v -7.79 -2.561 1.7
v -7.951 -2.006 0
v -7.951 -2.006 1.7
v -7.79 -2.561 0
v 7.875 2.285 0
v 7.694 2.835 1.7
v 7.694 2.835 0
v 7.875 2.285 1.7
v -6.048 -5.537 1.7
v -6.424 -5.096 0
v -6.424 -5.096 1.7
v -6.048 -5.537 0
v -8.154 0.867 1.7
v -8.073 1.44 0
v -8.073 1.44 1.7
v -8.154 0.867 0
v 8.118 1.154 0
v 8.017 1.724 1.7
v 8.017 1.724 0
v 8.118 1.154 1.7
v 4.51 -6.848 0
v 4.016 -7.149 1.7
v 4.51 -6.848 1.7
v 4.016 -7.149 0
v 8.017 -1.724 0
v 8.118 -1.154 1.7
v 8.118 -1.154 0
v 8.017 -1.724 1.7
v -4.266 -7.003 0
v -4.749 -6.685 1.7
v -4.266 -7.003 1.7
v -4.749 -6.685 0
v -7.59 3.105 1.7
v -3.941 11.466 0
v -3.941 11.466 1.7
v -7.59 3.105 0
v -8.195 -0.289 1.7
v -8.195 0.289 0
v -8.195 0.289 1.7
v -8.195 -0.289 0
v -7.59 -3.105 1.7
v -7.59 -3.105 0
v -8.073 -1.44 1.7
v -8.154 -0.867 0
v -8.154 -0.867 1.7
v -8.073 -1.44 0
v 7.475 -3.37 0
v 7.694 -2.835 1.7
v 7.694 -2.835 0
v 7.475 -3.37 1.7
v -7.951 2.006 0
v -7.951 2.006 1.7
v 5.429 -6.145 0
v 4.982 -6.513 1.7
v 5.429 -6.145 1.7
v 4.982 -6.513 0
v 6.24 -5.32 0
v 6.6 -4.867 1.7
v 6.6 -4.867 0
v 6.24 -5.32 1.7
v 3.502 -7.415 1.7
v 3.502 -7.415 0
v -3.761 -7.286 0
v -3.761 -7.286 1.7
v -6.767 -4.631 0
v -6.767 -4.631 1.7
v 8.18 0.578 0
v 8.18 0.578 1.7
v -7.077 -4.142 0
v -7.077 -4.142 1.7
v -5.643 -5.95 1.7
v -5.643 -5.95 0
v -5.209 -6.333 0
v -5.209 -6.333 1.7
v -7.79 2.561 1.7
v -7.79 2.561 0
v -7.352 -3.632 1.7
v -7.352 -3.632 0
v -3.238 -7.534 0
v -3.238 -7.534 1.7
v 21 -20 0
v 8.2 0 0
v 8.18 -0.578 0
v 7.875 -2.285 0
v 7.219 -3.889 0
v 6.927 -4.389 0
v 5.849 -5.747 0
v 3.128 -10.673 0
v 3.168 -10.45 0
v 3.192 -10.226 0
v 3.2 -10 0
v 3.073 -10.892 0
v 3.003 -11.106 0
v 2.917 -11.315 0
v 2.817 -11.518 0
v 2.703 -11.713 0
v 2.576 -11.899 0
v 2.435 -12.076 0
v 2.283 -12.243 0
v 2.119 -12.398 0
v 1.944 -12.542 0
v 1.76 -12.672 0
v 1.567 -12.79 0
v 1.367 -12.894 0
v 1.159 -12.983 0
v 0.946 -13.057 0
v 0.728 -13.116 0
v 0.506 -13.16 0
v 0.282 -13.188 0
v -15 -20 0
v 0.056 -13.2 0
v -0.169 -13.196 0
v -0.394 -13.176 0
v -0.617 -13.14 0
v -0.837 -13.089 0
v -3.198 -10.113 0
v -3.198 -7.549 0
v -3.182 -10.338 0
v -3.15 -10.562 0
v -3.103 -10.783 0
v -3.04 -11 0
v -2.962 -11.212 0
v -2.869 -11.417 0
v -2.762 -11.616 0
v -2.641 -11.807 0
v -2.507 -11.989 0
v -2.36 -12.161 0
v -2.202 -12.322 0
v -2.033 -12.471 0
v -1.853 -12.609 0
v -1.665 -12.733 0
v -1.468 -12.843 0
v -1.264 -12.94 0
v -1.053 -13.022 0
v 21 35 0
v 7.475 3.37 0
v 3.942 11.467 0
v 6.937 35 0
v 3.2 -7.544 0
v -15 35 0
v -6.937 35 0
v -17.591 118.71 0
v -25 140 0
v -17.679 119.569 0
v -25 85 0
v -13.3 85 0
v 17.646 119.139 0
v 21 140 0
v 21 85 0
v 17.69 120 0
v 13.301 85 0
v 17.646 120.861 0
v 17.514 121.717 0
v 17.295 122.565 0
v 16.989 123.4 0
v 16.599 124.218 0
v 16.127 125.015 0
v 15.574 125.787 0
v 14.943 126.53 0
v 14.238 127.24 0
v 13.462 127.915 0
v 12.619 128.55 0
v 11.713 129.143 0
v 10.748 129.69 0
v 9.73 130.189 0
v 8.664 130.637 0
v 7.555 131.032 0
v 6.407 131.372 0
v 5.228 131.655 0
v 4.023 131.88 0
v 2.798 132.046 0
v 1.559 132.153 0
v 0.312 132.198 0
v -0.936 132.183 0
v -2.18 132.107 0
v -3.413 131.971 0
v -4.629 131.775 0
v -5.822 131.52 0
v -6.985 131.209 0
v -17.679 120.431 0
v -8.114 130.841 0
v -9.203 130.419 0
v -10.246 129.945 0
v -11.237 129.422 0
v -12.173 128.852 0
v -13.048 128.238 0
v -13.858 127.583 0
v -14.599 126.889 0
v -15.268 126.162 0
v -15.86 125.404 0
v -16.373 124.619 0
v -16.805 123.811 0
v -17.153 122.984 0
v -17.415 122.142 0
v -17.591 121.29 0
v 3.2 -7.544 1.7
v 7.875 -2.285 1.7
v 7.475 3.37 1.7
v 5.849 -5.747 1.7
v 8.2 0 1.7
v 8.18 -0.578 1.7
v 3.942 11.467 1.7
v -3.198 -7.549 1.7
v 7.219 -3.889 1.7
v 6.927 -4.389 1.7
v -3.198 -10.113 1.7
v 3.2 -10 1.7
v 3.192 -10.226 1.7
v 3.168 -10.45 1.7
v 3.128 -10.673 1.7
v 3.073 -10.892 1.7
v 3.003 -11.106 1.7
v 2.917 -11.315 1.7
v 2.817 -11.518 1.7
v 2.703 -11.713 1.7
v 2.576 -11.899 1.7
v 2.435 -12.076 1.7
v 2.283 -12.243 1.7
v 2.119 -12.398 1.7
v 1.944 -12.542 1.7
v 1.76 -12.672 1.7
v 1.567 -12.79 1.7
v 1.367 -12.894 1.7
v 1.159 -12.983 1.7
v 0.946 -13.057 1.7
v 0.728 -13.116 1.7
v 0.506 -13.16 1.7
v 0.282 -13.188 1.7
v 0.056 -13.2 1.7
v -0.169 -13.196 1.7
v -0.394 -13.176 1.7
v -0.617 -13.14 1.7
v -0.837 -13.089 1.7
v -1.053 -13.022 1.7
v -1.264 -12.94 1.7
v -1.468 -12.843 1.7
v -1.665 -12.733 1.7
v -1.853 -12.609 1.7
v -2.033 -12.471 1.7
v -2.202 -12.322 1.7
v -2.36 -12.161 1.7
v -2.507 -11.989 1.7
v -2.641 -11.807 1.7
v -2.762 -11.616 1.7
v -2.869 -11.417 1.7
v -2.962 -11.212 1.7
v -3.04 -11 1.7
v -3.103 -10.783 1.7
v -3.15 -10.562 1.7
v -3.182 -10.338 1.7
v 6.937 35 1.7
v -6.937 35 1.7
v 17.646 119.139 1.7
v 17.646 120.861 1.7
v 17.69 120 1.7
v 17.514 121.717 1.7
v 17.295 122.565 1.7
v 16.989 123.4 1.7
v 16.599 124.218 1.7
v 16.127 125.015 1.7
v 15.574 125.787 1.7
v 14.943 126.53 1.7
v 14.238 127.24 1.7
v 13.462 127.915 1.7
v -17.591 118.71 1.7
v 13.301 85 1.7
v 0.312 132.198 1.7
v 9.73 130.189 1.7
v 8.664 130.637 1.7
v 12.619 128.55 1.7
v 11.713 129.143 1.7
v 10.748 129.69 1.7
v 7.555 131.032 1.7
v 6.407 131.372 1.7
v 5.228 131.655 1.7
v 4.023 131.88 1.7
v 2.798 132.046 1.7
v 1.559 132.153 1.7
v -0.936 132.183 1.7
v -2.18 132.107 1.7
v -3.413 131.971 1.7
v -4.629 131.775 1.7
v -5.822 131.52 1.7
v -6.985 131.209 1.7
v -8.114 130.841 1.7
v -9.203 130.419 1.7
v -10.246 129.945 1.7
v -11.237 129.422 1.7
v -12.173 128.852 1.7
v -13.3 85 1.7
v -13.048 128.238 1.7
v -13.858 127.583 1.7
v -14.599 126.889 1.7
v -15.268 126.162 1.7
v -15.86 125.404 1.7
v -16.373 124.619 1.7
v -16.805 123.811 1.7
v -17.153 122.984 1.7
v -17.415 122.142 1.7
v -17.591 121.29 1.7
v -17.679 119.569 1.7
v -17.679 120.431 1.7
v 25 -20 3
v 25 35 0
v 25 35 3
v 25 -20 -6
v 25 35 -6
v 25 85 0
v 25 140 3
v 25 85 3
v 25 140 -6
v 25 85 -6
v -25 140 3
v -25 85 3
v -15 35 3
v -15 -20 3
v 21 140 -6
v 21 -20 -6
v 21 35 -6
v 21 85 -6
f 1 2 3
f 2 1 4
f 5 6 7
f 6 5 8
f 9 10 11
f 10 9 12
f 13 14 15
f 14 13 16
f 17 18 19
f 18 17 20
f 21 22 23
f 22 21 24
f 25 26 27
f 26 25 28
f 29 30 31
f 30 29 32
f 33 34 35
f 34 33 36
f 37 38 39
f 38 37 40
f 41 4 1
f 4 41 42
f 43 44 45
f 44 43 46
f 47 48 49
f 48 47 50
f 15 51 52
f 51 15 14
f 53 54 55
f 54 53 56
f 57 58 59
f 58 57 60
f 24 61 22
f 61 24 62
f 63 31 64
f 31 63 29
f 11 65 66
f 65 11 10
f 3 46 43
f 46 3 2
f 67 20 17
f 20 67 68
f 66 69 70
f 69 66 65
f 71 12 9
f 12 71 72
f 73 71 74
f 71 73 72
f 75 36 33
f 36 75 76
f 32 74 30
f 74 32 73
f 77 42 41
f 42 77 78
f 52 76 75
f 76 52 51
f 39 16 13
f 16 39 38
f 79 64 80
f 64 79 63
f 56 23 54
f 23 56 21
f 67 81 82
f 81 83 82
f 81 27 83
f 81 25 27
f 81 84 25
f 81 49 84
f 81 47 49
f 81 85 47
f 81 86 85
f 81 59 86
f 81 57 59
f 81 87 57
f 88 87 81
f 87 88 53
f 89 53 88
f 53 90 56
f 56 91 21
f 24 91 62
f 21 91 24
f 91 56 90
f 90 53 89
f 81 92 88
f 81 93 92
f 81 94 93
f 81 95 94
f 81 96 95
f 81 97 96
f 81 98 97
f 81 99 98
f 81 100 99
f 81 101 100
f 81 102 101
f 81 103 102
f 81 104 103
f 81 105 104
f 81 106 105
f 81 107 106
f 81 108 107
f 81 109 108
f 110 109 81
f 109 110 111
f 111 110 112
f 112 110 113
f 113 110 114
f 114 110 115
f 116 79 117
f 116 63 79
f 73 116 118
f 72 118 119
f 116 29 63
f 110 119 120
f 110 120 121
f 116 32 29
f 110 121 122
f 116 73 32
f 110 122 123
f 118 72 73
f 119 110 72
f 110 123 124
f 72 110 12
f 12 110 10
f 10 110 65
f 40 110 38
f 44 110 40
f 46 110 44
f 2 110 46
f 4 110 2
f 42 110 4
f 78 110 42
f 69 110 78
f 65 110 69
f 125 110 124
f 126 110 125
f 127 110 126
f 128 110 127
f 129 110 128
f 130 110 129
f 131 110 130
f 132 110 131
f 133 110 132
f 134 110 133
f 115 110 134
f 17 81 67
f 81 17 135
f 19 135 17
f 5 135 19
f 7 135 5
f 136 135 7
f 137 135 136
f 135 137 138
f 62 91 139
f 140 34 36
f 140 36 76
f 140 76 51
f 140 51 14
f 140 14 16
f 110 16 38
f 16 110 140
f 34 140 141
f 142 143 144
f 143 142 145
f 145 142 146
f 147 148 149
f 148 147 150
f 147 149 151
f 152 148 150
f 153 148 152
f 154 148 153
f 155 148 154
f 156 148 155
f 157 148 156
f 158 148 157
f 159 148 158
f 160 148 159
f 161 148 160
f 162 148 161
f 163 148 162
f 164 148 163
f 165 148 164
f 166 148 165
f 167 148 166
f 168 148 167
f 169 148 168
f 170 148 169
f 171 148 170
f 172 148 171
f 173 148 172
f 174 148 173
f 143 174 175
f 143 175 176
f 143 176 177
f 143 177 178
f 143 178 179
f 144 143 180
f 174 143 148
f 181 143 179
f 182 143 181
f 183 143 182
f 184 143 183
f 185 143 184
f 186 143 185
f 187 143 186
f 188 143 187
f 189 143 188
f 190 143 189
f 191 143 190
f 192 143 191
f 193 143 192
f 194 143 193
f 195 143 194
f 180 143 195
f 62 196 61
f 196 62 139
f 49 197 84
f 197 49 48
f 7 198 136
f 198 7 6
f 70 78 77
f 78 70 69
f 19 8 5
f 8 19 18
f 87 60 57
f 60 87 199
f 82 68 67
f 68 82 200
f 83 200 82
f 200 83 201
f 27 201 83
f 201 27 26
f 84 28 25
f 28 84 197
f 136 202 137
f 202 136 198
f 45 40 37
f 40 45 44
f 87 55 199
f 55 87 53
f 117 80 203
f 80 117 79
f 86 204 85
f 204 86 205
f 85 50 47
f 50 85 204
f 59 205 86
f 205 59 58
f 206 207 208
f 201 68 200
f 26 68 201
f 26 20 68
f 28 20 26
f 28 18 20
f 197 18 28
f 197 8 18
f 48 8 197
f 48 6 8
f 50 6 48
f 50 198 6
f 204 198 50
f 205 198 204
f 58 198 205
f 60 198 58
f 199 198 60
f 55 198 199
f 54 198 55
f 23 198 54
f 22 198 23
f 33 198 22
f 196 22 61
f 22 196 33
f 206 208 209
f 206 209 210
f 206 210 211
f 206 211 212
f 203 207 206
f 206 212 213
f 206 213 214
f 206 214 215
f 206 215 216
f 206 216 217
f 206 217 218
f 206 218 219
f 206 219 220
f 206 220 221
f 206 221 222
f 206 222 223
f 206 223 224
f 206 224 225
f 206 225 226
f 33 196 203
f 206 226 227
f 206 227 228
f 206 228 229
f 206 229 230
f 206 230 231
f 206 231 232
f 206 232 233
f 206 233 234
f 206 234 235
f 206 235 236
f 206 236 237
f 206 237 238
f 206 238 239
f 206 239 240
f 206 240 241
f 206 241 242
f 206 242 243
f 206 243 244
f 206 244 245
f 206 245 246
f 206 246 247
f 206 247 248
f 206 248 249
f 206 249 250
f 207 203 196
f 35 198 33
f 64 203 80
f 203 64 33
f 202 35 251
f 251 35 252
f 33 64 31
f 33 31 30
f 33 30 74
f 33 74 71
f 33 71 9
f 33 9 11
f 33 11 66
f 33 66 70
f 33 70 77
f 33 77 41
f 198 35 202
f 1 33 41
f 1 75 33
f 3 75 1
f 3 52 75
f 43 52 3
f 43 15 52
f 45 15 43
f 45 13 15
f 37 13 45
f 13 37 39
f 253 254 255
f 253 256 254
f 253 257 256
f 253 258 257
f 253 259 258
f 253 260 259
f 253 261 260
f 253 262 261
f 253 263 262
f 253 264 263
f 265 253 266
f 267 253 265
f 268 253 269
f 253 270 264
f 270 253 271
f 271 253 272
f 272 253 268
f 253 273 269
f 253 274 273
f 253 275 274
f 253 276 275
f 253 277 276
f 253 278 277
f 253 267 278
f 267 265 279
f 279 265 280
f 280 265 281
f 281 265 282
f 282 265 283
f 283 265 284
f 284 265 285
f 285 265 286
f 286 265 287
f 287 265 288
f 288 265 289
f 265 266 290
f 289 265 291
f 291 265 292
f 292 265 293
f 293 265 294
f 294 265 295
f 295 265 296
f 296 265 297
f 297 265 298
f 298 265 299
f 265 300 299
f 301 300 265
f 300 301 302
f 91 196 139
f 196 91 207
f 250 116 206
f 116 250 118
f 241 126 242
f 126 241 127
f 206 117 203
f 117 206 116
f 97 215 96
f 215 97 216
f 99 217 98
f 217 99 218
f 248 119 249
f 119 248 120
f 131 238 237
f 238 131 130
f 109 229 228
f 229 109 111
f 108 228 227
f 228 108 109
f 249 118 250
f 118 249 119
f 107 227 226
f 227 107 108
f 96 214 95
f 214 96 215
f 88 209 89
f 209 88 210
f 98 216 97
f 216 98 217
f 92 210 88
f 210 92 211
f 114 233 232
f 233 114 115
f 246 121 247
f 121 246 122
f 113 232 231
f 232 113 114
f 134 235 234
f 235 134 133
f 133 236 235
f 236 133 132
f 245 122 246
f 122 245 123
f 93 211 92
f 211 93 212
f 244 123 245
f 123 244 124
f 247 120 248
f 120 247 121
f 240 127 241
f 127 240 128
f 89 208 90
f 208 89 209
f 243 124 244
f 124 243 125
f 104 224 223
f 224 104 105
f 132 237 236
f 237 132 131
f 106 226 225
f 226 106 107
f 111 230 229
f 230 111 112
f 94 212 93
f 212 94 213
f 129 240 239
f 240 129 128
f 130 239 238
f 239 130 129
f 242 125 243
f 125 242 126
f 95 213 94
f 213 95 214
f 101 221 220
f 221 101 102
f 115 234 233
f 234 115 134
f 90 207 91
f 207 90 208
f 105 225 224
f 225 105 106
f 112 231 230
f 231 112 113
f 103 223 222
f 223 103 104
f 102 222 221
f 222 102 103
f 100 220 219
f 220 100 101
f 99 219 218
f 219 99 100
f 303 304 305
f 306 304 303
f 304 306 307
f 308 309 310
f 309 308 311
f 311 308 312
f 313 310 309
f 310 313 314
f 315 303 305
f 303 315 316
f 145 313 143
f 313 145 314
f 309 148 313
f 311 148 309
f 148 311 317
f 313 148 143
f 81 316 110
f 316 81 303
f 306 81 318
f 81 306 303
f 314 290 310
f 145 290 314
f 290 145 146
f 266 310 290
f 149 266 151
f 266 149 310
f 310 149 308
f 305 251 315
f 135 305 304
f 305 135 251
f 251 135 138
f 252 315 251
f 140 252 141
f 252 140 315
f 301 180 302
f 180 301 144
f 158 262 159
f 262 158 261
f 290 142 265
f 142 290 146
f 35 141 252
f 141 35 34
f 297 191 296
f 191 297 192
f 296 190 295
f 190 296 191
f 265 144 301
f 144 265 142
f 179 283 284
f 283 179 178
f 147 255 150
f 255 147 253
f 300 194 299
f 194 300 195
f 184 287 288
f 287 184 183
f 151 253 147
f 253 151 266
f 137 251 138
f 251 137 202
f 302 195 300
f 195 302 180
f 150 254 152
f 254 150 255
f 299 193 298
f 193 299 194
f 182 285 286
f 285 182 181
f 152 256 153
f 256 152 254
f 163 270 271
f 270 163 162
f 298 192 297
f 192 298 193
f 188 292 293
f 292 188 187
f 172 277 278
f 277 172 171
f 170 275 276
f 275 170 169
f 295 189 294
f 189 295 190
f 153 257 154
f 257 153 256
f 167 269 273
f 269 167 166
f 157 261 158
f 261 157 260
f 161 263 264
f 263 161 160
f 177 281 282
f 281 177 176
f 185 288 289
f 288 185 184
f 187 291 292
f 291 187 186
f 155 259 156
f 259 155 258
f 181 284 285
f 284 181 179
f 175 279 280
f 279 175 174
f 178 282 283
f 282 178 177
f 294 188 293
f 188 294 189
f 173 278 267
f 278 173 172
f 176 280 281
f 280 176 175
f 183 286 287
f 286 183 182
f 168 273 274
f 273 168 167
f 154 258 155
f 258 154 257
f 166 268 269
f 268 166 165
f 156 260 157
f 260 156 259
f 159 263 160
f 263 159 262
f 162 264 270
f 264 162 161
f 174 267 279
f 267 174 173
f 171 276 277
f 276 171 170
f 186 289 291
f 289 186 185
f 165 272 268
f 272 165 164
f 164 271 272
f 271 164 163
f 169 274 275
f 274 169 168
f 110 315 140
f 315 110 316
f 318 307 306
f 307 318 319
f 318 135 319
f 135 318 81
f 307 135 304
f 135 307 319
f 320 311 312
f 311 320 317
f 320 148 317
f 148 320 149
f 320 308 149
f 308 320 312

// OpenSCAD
// file: fan9black.scad
module fan9black_1()
{
 /* Generated by trace2scad version 20150415
    http://aggregate.org/MAKE/TRACE2SCAD/
    Optimized model has 324/4227 original points
 */
  minx=0; /* polygon minx=0 */
  miny=0; /* polygon miny=0 */
  maxx=20000; /* polygon maxx=20000 */
  maxy=12520; /* polygon maxy=12520 */
  dx=maxx-minx;
  dy=maxy-miny;
  maxd=((dx>dy)?dx:dy);
 scale([1/maxd, 1/maxd, 1])
 translate([-minx-dx/2, -miny-dy/2, 0])
 linear_extrude(height=1, convexity=324)
 union() {
  union() {
   union() {
    difference() {
     polygon([[0,6260],[0,0],[20000,0],[20000,12520],[0,12520]], convexity=5);
     polygon([[10766,12150],[10779,12140],[11111,12071],[10364,7345],[10437,7251],[10675,8296],[11485,11995],[12186,11849],[10641,7131],[10723,7120],[12573,11774],[13475,11581],[10939,7110],[11006,7106],[13774,11526],[14097,11459],[14546,11178],[11208,7070],[11304,7040],[14746,11060],[15640,10518],[11520,6895],[11571,6861],[15908,10365],[16090,10246],[16158,10185],[16207,10172],[16269,10131],[16334,10127],[16390,10090],[16444,10090],[16835,9666],[12025,6821],[12238,6849],[17059,9440],[17715,8741],[13400,7042],[13507,6965],[17929,8525],[18280,8155],[18280,8119],[18334,8056],[18359,8023],[18412,7396],[14238,6560],[14345,6454],[18440,7117],[18509,6374],[17855,5674],[17855,5630],[17773,5514],[17645,5468],[17471,5193],[17210,4766],[17110,4578],[17060,4489],[16433,2345],[12498,100],[8355,254],[8023,275],[7753,316],[7563,350],[7354,357],[5553,860],[5404,1008],[3070,4289],[3053,4359],[3010,4443],[2540,5674],[2489,5730],[1783,5738],[1746,7193],[6943,6302],[7127,6323],[7219,6353],[1736,7487],[1719,7818],[2388,8460],[7729,6597],[7760,6602],[7816,6657],[2594,8670],[3478,9518],[8151,6886],[8171,6944],[8153,6972],[3665,9707],[4388,10401],[8303,7280],[8353,7338],[4570,10592],[4626,10640],[4838,10783],[5540,11035],[8355,7829],[8355,8004],[5845,11144],[6710,11440],[8571,8389],[8665,8470],[6975,11535],[7774,11816],[9001,8746],[9141,8755],[8080,11845],[8895,11938],[9498,9110],[9530,9189],[9536,9245],[9594,9308],[9150,11968],[9990,12076],[10054,8804],[10135,8650],[10174,8522],[10203,8499],[10305,12112],[10754,12160]], convexity=74);
    }
    union() {
     difference() {
      polygon([[9642,9024],[9631,9008],[9558,8795],[9503,8649],[9446,8595],[8998,8552],[8963,8516],[8718,8290],[8571,8134],[8534,8025],[8538,7858],[8631,7720],[8662,7686],[8855,7701],[8975,7638],[8998,7617],[9185,7613],[9295,7669],[9653,7669],[9715,7603],[9715,7557],[9652,7495],[9346,7510],[9106,7390],[8976,7383],[8939,7410],[8833,7321],[8646,7267],[8368,7106],[8340,6955],[8309,6808],[8128,6599],[7840,6441],[7632,6300],[7428,6221],[7310,6195],[7249,6183],[6990,6115],[6790,6108],[6687,6100],[6574,6019],[6408,5973],[6283,5973],[6158,6032],[6080,6103],[5743,6115],[5680,6060],[5474,5820],[5598,5698],[5723,5681],[6277,5688],[6741,5688],[7103,5655],[7628,5661],[8635,5679],[8715,5727],[8786,5826],[8799,5855],[8710,5995],[8680,6088],[8706,6191],[8778,6274],[8907,6358],[9232,6515],[9398,6630],[9531,6828],[9612,6951],[9723,7010],[9796,7028],[9839,7040],[9872,7040],[9930,6983],[9930,6929],[9864,6861],[9723,6826],[9531,6543],[9395,6430],[9233,6323],[8926,6173],[8858,6118],[8848,6101],[8914,5968],[8975,5886],[8956,5793],[8925,5730],[9005,5709],[9245,5735],[9727,5741],[10055,5729],[10263,5714],[11883,5729],[12350,5729],[12942,5694],[13570,5701],[13817,5735],[14006,5748],[14346,5753],[14421,5730],[14448,5714],[14495,5596],[14460,5519],[14411,5480],[14226,5438],[13957,5297],[13814,5224],[13773,5215],[13683,5144],[13585,5072],[13508,5020],[13411,4925],[13305,4775],[13238,4631],[13114,4405],[13072,4223],[13006,4057],[12863,3950],[12792,3940],[12733,4011],[12725,4124],[12670,4160],[12525,4050],[12509,3988],[12525,3910],[12586,3790],[12640,3739],[12813,3743],[12875,3775],[13015,3793],[13196,3923],[13305,4104],[13409,4332],[13497,4468],[13803,4794],[13986,4937],[14180,5070],[14224,5080],[14380,5189],[14463,5227],[14633,5305],[14773,5409],[14829,5463],[14991,5610],[15022,5758],[15024,5808],[14830,6038],[14774,6180],[14635,6168],[14558,6160],[14426,6193],[14215,6340],[14078,6417],[13833,6542],[13592,6721],[13499,6755],[13204,6950],[13133,6937],[12985,6889],[12754,6648],[12710,6560],[12710,6404],[12653,6345],[12598,6345],[12539,6404],[12543,6598],[12615,6735],[12370,6674],[11815,6615],[11600,6610],[11444,6688],[11158,6876],[11063,6923],[10838,6939],[10513,6978],[10280,7129],[10168,7256],[10130,7467],[10115,7568],[10116,8178],[9998,8475],[9863,8806],[9653,9040]], convexity=49);
      polygon([[9212,8351],[9241,8331],[9265,8272],[9249,8225],[9180,8175],[9054,8183],[8994,8231],[9009,8313],[9081,8359],[9183,8370]], convexity=6);
     }
    }
    polygon([[8760,7529],[8728,7524],[8637,7474],[8618,7473],[8610,7445],[8607,7435],[8743,7464],[8808,7501],[8820,7528],[8793,7534]], convexity=5);
   }
  }
 }
}

module fan9black()
{
 /* all layers combined, scaled to within a 1mm cube */
 scale([1, 1, 1/1])
 difference() {
  union() {
   scale([1,1,2]) translate([0,0,-0.5]) fan9black_1();
  }
  translate([0,0,-2]) cube([2,2,4],center=true);
 }
}
fan9black();
// file: fan9blue.scad
module fan9blue_1()
{
 /* Generated by trace2scad version 20150415
    http://aggregate.org/MAKE/TRACE2SCAD/
    Optimized model has 138/917 original points
 */
  minx=0; /* polygon minx=0 */
  miny=0; /* polygon miny=0 */
  maxx=20000; /* polygon maxx=20000 */
  maxy=12520; /* polygon maxy=12520 */
  dx=maxx-minx;
  dy=maxy-miny;
  maxd=((dx>dy)?dx:dy);
 scale([1/maxd, 1/maxd, 1])
 translate([-minx-dx/2, -miny-dy/2, 0])
 linear_extrude(height=1, convexity=138)
 union() {
  union() {
   polygon([[0,11961],[0,11401],[191,11331],[379,11304],[638,11346],[842,11449],[1013,11603],[1135,11808],[1188,12015],[1188,12200],[1129,12418],[1078,12520],[0,12520]], convexity=5);
   polygon([[19072,12509],[19066,12498],[18988,12305],[18970,12127],[19017,11918],[19126,11741],[19293,11601],[19493,11526],[19683,11521],[19838,11555],[20000,11643],[20000,12520],[19078,12520]], convexity=6);
   polygon([[5010,5745],[4763,5741],[2530,5718],[3010,4443],[3070,4307],[3119,4211],[5404,1008],[5553,860],[7380,350],[7665,335],[7945,283],[8138,258],[11588,136],[12498,100],[16444,2354],[17071,4526],[17210,4752],[17290,4908],[17519,5281],[17664,5485],[17773,5514],[17820,5565],[17820,5618],[17762,5674],[17288,5658],[17178,5666],[15248,5668],[15185,5652],[15145,5567],[15120,5482],[14813,5213],[14467,5013],[14319,4917],[14208,4852],[14097,4784],[13806,4531],[13682,4403],[13530,4155],[13480,4075],[13466,3997],[13389,3913],[13290,3784],[13217,3722],[13008,3606],[12858,3572],[12788,3548],[12610,3555],[12437,3682],[12355,3833],[12331,4009],[12385,4175],[12518,4311],[12665,4343],[12725,4329],[12775,4300],[12853,4292],[12904,4278],[13005,4562],[13074,4685],[13206,4908],[13484,5238],[13704,5364],[13898,5493],[14006,5540],[14002,5553],[13728,5552],[13318,5519],[12743,5529],[12667,5549],[11921,5545],[11430,5549],[10142,5538],[10073,5551],[10050,5571],[9168,5566],[9033,5525],[8894,5536],[8778,5547],[8665,5479],[7993,5490],[7833,5478],[7631,5484],[7067,5498],[6475,5477],[6273,5489],[6185,5515],[5733,5504],[5683,5527],[5568,5533],[5458,5590],[5291,5736],[5258,5748]], convexity=30);
   polygon([[19688,822],[19638,816],[19413,739],[19230,597],[19125,461],[19051,268],[19035,103],[19047,0],[20000,0],[20000,800],[19738,829]], convexity=6);
   polygon([[0,371],[0,0],[763,9],[704,218],[594,413],[414,591],[238,689],[63,732],[0,741]], convexity=5);
  }
 }
}

module fan9blue()
{
 /* all layers combined, scaled to within a 1mm cube */
 scale([1, 1, 1/1])
 difference() {
  union() {
   scale([1,1,2]) translate([0,0,-0.5]) fan9blue_1();
  }
  translate([0,0,-2]) cube([2,2,4],center=true);
 }
}
fan9blue();
// file: fan9yellow.scad
module fan9yellow_1()
{
 /* Generated by trace2scad version 20150415
    http://aggregate.org/MAKE/TRACE2SCAD/
    Optimized model has 382/1871 original points
 */
  minx=0; /* polygon minx=0 */
  miny=0; /* polygon miny=0 */
  maxx=20000; /* polygon maxx=20000 */
  maxy=12520; /* polygon maxy=12520 */
  dx=maxx-minx;
  dy=maxy-miny;
  maxd=((dx>dy)?dx:dy);
 scale([1/maxd, 1/maxd, 1])
 translate([-minx-dx/2, -miny-dy/2, 0])
 linear_extrude(height=1, convexity=382)
 union() {
  union() {
   polygon([[0,11961],[0,11401],[191,11331],[379,11304],[638,11346],[842,11449],[1013,11603],[1135,11808],[1188,12015],[1188,12200],[1129,12418],[1078,12520],[0,12520]], convexity=5);
   polygon([[19072,12509],[19066,12498],[18988,12305],[18970,12127],[19017,11918],[19126,11741],[19293,11601],[19493,11526],[19683,11521],[19838,11555],[20000,11643],[20000,12520],[19078,12520]], convexity=6);
   union() {
    difference() {
     polygon([[9604,9306],[9596,9303],[9533,9226],[9514,9128],[9464,9043],[9388,8885],[9383,8788],[9223,8761],[9073,8740],[9005,8745],[8911,8695],[8761,8541],[8547,8362],[8485,8309],[8408,8248],[8370,8179],[8363,8007],[8365,7784],[8450,7673],[8544,7534],[8612,7475],[8656,7475],[8728,7524],[8819,7528],[8788,7480],[8580,7428],[8436,7374],[8363,7338],[8167,7136],[8165,6905],[8142,6885],[7714,6580],[7583,6508],[7328,6363],[6983,6299],[6629,6270],[6408,6165],[6276,6177],[6095,6284],[6013,6310],[5795,6303],[5655,6270],[5539,6170],[5442,6033],[5259,5810],[5264,5753],[5470,5575],[5551,5530],[5683,5515],[6233,5515],[6329,5460],[7064,5470],[7776,5456],[8033,5461],[8075,5503],[8543,5502],[8625,5475],[8712,5505],[8791,5545],[8920,5528],[8967,5500],[9041,5508],[9128,5554],[9536,5580],[9697,5574],[10024,5562],[10124,5543],[10219,5515],[10620,5526],[10945,5536],[12065,5535],[12821,5505],[13948,5524],[13720,5382],[13615,5317],[13513,5254],[13389,5147],[13157,4857],[13078,4689],[12954,4463],[12919,4348],[12898,4255],[12821,4305],[12652,4350],[12494,4300],[12372,4179],[12341,4091],[12323,4064],[12329,3913],[12412,3709],[12533,3595],[12673,3533],[12768,3533],[13051,3615],[13258,3748],[13384,3878],[13499,4071],[13564,4198],[13690,4408],[13835,4549],[14053,4739],[14248,4855],[14573,5057],[14698,5136],[14840,5213],[15120,5468],[15163,5623],[15225,5662],[15258,5716],[15246,5784],[15137,5945],[15030,6085],[14970,6192],[14878,6311],[14788,6346],[14584,6335],[14293,6485],[14101,6629],[13838,6782],[13658,6890],[13535,6940],[13242,7125],[13066,7112],[12803,7010],[12553,6910],[12068,6819],[11860,6823],[11624,6826],[11564,6856],[11410,6999],[11119,7090],[10616,7130],[10490,7193],[10400,7294],[10335,7395],[10324,7500],[10301,8098],[10286,8313],[10240,8444],[10156,8559],[10092,8745],[9997,8900],[9845,9100],[9698,9286],[9613,9310]], convexity=34);
     polygon([[9662,9037],[9670,9034],[9880,8784],[9998,8475],[10116,8178],[10122,7539],[10159,7289],[10202,7213],[10325,7088],[10538,6974],[10838,6939],[11063,6923],[11263,6810],[11489,6655],[11600,6610],[11833,6621],[12488,6694],[12615,6735],[12543,6598],[12539,6404],[12598,6345],[12653,6345],[12710,6404],[12710,6560],[12799,6708],[12985,6889],[13181,6950],[13231,6927],[13546,6747],[13661,6678],[13862,6525],[14078,6417],[14238,6323],[14426,6193],[14585,6155],[14723,6180],[14774,6180],[14839,6016],[15024,5808],[15008,5688],[14991,5610],[14829,5463],[14639,5305],[14494,5249],[14406,5197],[14263,5112],[14205,5080],[14115,5029],[13891,4863],[13731,4723],[13439,4389],[13305,4104],[13196,3923],[13015,3793],[12844,3759],[12813,3743],[12640,3739],[12586,3790],[12525,3927],[12512,4009],[12535,4069],[12670,4160],[12725,4124],[12733,4011],[12792,3940],[12863,3950],[13006,4057],[13072,4223],[13098,4355],[13143,4465],[13238,4631],[13326,4811],[13466,4989],[13585,5072],[13773,5215],[13880,5250],[14087,5372],[14268,5452],[14439,5495],[14495,5576],[14495,5617],[14448,5714],[14395,5746],[14143,5760],[14006,5748],[13905,5743],[13719,5725],[13438,5694],[12871,5699],[12333,5735],[11883,5729],[10168,5719],[9889,5735],[9343,5740],[9142,5727],[9005,5709],[8925,5730],[8975,5866],[8930,5953],[8875,6041],[8848,6101],[8885,6145],[9105,6271],[9304,6368],[9497,6509],[9670,6735],[9723,6826],[9864,6861],[9930,6929],[9930,6983],[9872,7040],[9807,7040],[9785,7016],[9697,6997],[9612,6951],[9514,6795],[9398,6630],[9136,6465],[8892,6355],[8721,6220],[8686,6125],[8688,6053],[8775,5884],[8799,5855],[8748,5768],[8682,5700],[8613,5673],[7628,5661],[7075,5663],[6718,5695],[6277,5688],[5678,5691],[5568,5714],[5474,5820],[5723,6104],[5833,6115],[6080,6103],[6213,5999],[6283,5973],[6408,5973],[6599,6029],[6687,6100],[7029,6127],[7249,6183],[7468,6231],[7643,6300],[7840,6441],[8128,6599],[8325,6839],[8359,7090],[8378,7122],[8679,7276],[8862,7336],[8947,7410],[8976,7383],[9106,7390],[9260,7468],[9346,7510],[9652,7495],[9715,7557],[9706,7618],[9653,7669],[9295,7669],[9185,7613],[8998,7617],[8943,7660],[8828,7704],[8662,7686],[8553,7829],[8538,7858],[8534,8025],[8581,8158],[8766,8327],[8963,8516],[8998,8552],[9352,8593],[9447,8597],[9503,8649],[9576,8865],[9654,9040]], convexity=45);
    }
    polygon([[9081,8359],[9050,8349],[9009,8313],[8994,8231],[9061,8175],[9180,8175],[9249,8225],[9265,8272],[9241,8331],[9183,8370],[9113,8369]], convexity=7);
   }
   polygon([[19688,822],[19638,816],[19413,739],[19230,597],[19125,461],[19051,268],[19035,103],[19047,0],[20000,0],[20000,800],[19738,829]], convexity=6);
   polygon([[0,371],[0,0],[763,9],[704,218],[594,413],[414,591],[238,689],[63,732],[0,741]], convexity=5);
  }
 }
}

module fan9yellow()
{
 /* all layers combined, scaled to within a 1mm cube */
 scale([1, 1, 1/1])
 difference() {
  union() {
   scale([1,1,2]) translate([0,0,-0.5]) fan9yellow_1();
  }
  translate([0,0,-2]) cube([2,2,4],center=true);
 }
}
fan9yellow();
// file: fan9red.scad
module fan9red_1()
{
 /* Generated by trace2scad version 20150415
    http://aggregate.org/MAKE/TRACE2SCAD/
    Optimized model has 243/3466 original points
 */
  minx=0; /* polygon minx=0 */
  miny=0; /* polygon miny=0 */
  maxx=20000; /* polygon maxx=20000 */
  maxy=12520; /* polygon maxy=12520 */
  dx=maxx-minx;
  dy=maxy-miny;
  maxd=((dx>dy)?dx:dy);
 scale([1/maxd, 1/maxd, 1])
 translate([-minx-dx/2, -miny-dy/2, 0])
 linear_extrude(height=1, convexity=243)
 union() {
  union() {
   polygon([[0,11961],[0,11401],[191,11331],[379,11304],[638,11346],[842,11449],[1013,11603],[1135,11808],[1188,12015],[1188,12200],[1129,12418],[1078,12520],[0,12520]], convexity=5);
   polygon([[19072,12509],[19066,12498],[18988,12305],[18970,12127],[19017,11918],[19126,11741],[19293,11601],[19493,11526],[19683,11521],[19838,11555],[20000,11643],[20000,12520],[19078,12520]], convexity=6);
   polygon([[10685,12155],[10643,12151],[10298,12104],[10205,8453],[10274,8385],[10295,8199],[10311,8147],[10295,8109],[10302,7590],[10346,7340],[10360,7343],[11108,12074],[10766,12150],[10728,12159]], convexity=8);
   polygon([[9974,12072],[9971,12069],[9145,11965],[9593,9313],[9678,9289],[9768,9205],[9829,9103],[9918,8990],[9983,8911],[10059,8833],[9990,12075],[9977,12075]], convexity=5);
   polygon([[11480,11986],[11475,11976],[10443,7198],[10508,7193],[10626,7131],[12186,11849],[11485,11995]], convexity=6);
   polygon([[8869,11942],[8866,11939],[8080,11845],[9160,8730],[9217,8745],[9272,8758],[9330,8774],[9385,8792],[9385,8875],[9489,9105],[8889,11945],[8872,11945]], convexity=6);
   polygon([[7760,11810],[7753,11806],[6975,11531],[8681,8465],[8818,8590],[8962,8731],[8995,8748],[7771,11815],[7768,11815]], convexity=6);
   polygon([[12563,11764],[12556,11753],[10725,7123],[10867,7106],[10932,7108],[13475,11589],[12571,11775]], convexity=6);
   polygon([[13668,11359],[13564,11193],[11011,7094],[11134,7090],[11192,7067],[14550,11184],[14070,11464],[13772,11525]], convexity=6);
   polygon([[6643,11422],[6593,11404],[5845,11135],[8380,7987],[8377,8202],[8498,8323],[8570,8372],[6710,11440],[6693,11439]], convexity=8);
   polygon([[14715,11034],[14693,11008],[11306,7029],[11403,6996],[11500,6896],[15640,10518],[14746,11060],[14737,11060]], convexity=6);
   polygon([[5495,11023],[5463,11012],[4898,10809],[4757,10740],[4626,10640],[4570,10581],[8370,7335],[8615,7459],[8508,7578],[8420,7717],[8365,7769],[8350,7823],[5538,11035],[5528,11034]], convexity=7);
   polygon([[4343,10371],[4308,10338],[3665,9701],[8156,6969],[8172,6985],[8179,7122],[8289,7276],[4378,10405]], convexity=6);
   polygon([[15877,10348],[15858,10332],[11565,6847],[11623,6828],[12008,6819],[16834,9673],[16444,10090],[16390,10090],[16334,10127],[16248,10145],[16173,10185],[16108,10227],[15990,10315],[15897,10365]], convexity=6);
   polygon([[3425,9479],[3383,9438],[2594,8670],[7826,6659],[7979,6740],[8070,6815],[8118,6856],[8130,6889],[3468,9520]], convexity=6);
   polygon([[17003,9417],[16963,9395],[12252,6849],[12369,6870],[12463,6888],[12663,6945],[12922,7040],[13092,7105],[13212,7130],[13400,7049],[17715,8749],[17051,9440],[17043,9440]], convexity=7);
   polygon([[17843,8503],[17783,8481],[13505,6957],[13913,6726],[14070,6626],[14195,6564],[18420,7403],[18349,8050],[18320,8074],[18280,8137],[18280,8155],[17916,8525],[17903,8524]], convexity=9);
   polygon([[2326,8409],[2273,8358],[1719,7818],[1740,7482],[7298,6350],[7730,6594],[2379,8460]], convexity=6);
   polygon([[1746,7194],[1740,7187],[1788,5735],[5223,5720],[5311,5895],[5440,6042],[5588,6221],[5633,6265],[5752,6295],[6122,6285],[6230,6200],[6363,6140],[6419,6165],[6574,6242],[6642,6270],[6934,6303],[1751,7200]], convexity=8);
   polygon([[18375,7111],[18338,7104],[14349,6446],[14532,6350],[14778,6330],[14849,6336],[14929,6273],[14955,6171],[15010,6098],[15075,5990],[15233,5810],[15265,5667],[17832,5655],[18515,6383],[18440,7120],[18413,7119]], convexity=9);
   polygon([[19688,822],[19638,816],[19413,739],[19230,597],[19125,461],[19051,268],[19035,103],[19047,0],[20000,0],[20000,800],[19738,829]], convexity=6);
   polygon([[0,371],[0,0],[763,9],[704,218],[594,413],[414,591],[238,689],[63,732],[0,741]], convexity=5);
  }
 }
}

module fan9red()
{
 /* all layers combined, scaled to within a 1mm cube */
 scale([1, 1, 1/1])
 difference() {
  union() {
   scale([1,1,2]) translate([0,0,-0.5]) fan9red_1();
  }
  translate([0,0,-2]) cube([2,2,4],center=true);
 }
}
fan9red();
// main file
//====================================================================
// fan10.scad  "Cats under the stars" smaller version, ditch detents
// 
// Fan redux after a long break
// Dr Tom Flint, 17 July 2023
//
//====================================================================


use <../Parts/threads.scad>
use <./fan9red.scad>
use <./fan9yellow.scad>
use <./fan9blue.scad>
use <./fan9black.scad>


layer = 0.3;          // thickness of 1 layer
thick = 5*layer;    // thickness of the hub

tall = 120;     // distance between hub and center of tip circle
stub = 10;      // distance hub to base circle
mid = 50;       // out to end of the hub, start of the blades

cut12=11;     // cut between blades 1 and 2

edge = 0.4;     // width of clear edge on blades
rbase = 8;      // radius of the base circle
rbasehole = 4;
//rmid1=16;

x2=14.5-2*edge;   // width of blade2 base, subtract edge
pega=0.25;      // offset of the 2 pegs

rfinger=3;

rtip = 12;      // radius of the tip circle
tipscale = 1.45;

Nblade=7;          // number of blades
full = 110;
folded = 5;

delta=full/Nblade;   // angle between blades when open
deltaFold=folded/Nblade;   // angle between blades when open

doff = 42.8;      // angle offset to center blades on y axis

spread = 21;    // distance between blades when unfan
yfix = 36;

smagx = 280;    // image magnification, scales on x and y
smagy = 280;    // image magnification, scales on x and y
soff = 67;    // image offset in X

ribbonx = 1.2;
ribbony = 11;
ribbond = 5;
ribbont = 118;    // height along blade to place ribbon 

//~ detent = 1.6;   // size of the detent in blade1
//~ dplus = 0.5;    // tolerance around the detent cut vs boss


//------------------------------------------------------------------
module blade1(){

$fn = 89;

  difference(){
       // main blade
    intersection(){
    // cut off bottom section that should be black
    translate([0,-cut12,0])
    cylinder(r=2*cut12,h=3*thick,center=true);

    union(){
      
      // at the pivot
      hull(){
        cylinder(r=rbase,h=thick);
        translate([0,0.25*mid,0])
        cylinder(r=3,h=thick);
      }
            
      // tail section
      hull(){
        translate([0,0,0])
        cylinder(r=rbasehole-1,h=thick);

        translate([0,-stub,0])
        cylinder(r=3,h=thick);
      }
            
       // main blade    
      hull(){
        translate([0,tall,0])
        scale([tipscale,1,1])
        cylinder(r=rtip-edge,h=thick);

        translate([0,-stub,0])
        cylinder(r=1.0-edge,h=thick);
      }
    
    
    }  // end of the union
  }
        
    // pivot hole
    cylinder(r=rbasehole,h=3*thick,center=true);
    
    // cut clear edge off
    blade1edge();
      
    // holes in tail stub
    translate([0,-stub,0])
    cylinder(r=1.5,h=thick*3,center=true);
      
    // side cut to make smooth waist
    rotate([0,0,2.3*delta])
    translate([0,14,0])
    cylinder(r=5,h=thick*3,center=true);

    rotate([0,0,-2.3*delta])
    translate([0,14,0])
    cylinder(r=5,h=thick*3,center=true);
    
  }


}
//------------------------------------------------------------------
module blade2(){

$fn = 89;

  difference(){
    union(){
      
     // main blade
      hull(){
        translate([0,tall,0])
        scale([tipscale,1,1])
        cylinder(r=rtip-edge,h=thick);

        translate([0,-stub,0])
        cylinder(r=1.0-edge,h=thick);
      }
        
    }  // end of the union

    
    // cut off bottom section that should be black
    cylinder(r=cut12,h=3*thick,center=true);

        
    // ribbon cuts
    translate([0,ribbont,0])     
    hull(){
      translate([0,ribbony/2,0])     
      cylinder(r=ribbonx/2,h=10,center=true);
      translate([0,-ribbony/2,0])     
      cylinder(r=ribbonx/2,h=10,center=true);
    }
    rotate([0,0,delta/4])
    translate([0,ribbont,0])     
    hull(){
      translate([0,ribbony/2,0])     
      cylinder(r=ribbonx/2,h=10,center=true);
      translate([0,-ribbony/2,0])     
      cylinder(r=ribbonx/2,h=10,center=true);
    }
    rotate([0,0,-delta/4])
    translate([0,ribbont,0])     
    hull(){
      translate([0,ribbony/2,0])     
      cylinder(r=ribbonx/2,h=10,center=true);
      translate([0,-ribbony/2,0])     
      cylinder(r=ribbonx/2,h=10,center=true);
    }
    
    // ribbon topside clearance
    //~ for(i=[-6:15]){
      //~ rotate([0,0,1.0*i])
      //~ translate([0,ribbont,0.75*thick+0.125*thick])     
      //~ cube([3,ribbony+4,0.25*thick],center=true);
    //~ }

    // ribbon bottom side clearance
    for(i=[-15:15]){
      rotate([0,0,1.0*i])
      translate([0,ribbont,layer])     
      cube([3,ribbony+4,2*layer],center=true);
    }

  }
  

}

//------------------------------------------------------------------
module blade1edge(){

$fn = 89;

  difference(){
    union(){
      
     // main blade
      hull(){
        translate([0,tall,0])
        scale([tipscale,1,1])
        cylinder(r=rtip,h=thick);

        translate([0,-stub,0])
        cylinder(r=1.0,h=thick);
      }        
    }  // end of the union
        
    // pivot hole
    cylinder(r=rbasehole,h=3*thick,center=true);

    
    // ribbon topside clearance
    //~ for(i=[-6:15]){
      //~ rotate([0,0,1.0*i])
      //~ translate([0,ribbont,0.75*thick+0.125*thick])     
      //~ cube([2,ribbony+4,0.25*thick],center=true);
    //~ }

    // ribbon bottom side clearance
    for(i=[-15:15]){
      rotate([0,0,1.0*i])
      translate([0,ribbont,layer])     
      cube([3,ribbony+4,2*layer],center=true);
    }

    // central cut
    hull(){
      translate([0,tall,0])
      scale([tipscale,1,1])
      cylinder(r=rtip-edge,h=3*thick,center=true);

      translate([0,-stub+6,0])
      cylinder(r=1.0-edge,h=3*thick,center=true);
    }        
      
    // cut off tail section
    translate([0,-20,0])     
    cube([40,60,3*thick],center=true);
    
    
  }
  

}


//------------------------------------------------------------------
module fan1(){

  for(i=[0:Nblade-1]){
    translate([0,0,i*thick])
    rotate([0,0,i*delta+doff]){
    color([i/Nblade*0.5+0.5, i/Nblade*0.5+0.5, i/Nblade*0.5+0.5])
      blade1();
    color([i/Nblade*0.5+0.5, i/Nblade*0.5+0.5, 0.5])
      blade2();
    color([i/Nblade*0.5+0.5, i/Nblade*0.5+0.5, i/Nblade*0.5+0.5])
    blade1edge();
    }
  }
}

//------------------------------------------------------------------
module fan1Folded(){

  for(i=[0:Nblade-1]){
    translate([0,0,i*thick])
    //rotate([0,0,i*deltaFold+doff])
    color([i/Nblade, i/Nblade, i/Nblade])
    blade1();
    translate([0,0,i*thick])
    //rotate([0,0,i*deltaFold+doff])
    color([i/Nblade, i/Nblade, i/Nblade])
    blade2();
    translate([0,0,i*thick])
    //rotate([0,0,i*deltaFold+doff])
    color([i/Nblade, i/Nblade, i/Nblade])
    blade1edge();
  }
}


//------------------------------------------------------------------
module fan1edge(first=0,last=Nblade-1){

  for(i=[first:last]){
    translate([0,0,i*thick])
    rotate([0,0,i*delta+doff])
    color([i/Nblade,i/Nblade,i/Nblade])
    blade1edge();
  }
}

//------------------------------------------------------------------
module unfan1edge(first=0,last=Nblade-1){

  for(i=[first:last]){
    // unform the fan
    translate([spread*i,0,-i*thick])
    rotate([0,0,180*i])
    translate([0,-yfix,0])
    rotate([0,0,-i*delta-doff])

    translate([0,0,i*thick])
    rotate([0,0,i*delta+doff])
    color([i/Nblade,i/Nblade,i/Nblade])
    blade1edge();
  }
}

//------------------------------------------------------------------
module unfan1(first=0,last=Nblade-1){

  for(i=[first:last]){
    // unform the fan
    translate([spread*i,0,-i*thick])
    rotate([0,0,180*i])
    translate([0,-yfix,0])
    rotate([0,0,-i*delta-doff])
    
    // form the fan
    translate([0,0,i*thick])
    rotate([0,0,i*delta+doff])
    color([i/Nblade,i/Nblade,i/Nblade])
    blade1();
    translate([0,0,i*thick])
    rotate([0,0,i*delta+doff])
    color([i/Nblade,i/Nblade,i/Nblade])
    blade1edge();
    translate([0,0,i*thick])
    rotate([0,0,i*delta+doff])
    color([i/Nblade,i/Nblade,i/Nblade])
    blade2();
  }
}

//------------------------------------------------------------------
module fanred(first=0,last=Nblade-1){
    
  intersection(){
      for(i=[first:last]){
        translate([0,0,i*thick])
        rotate([0,0,i*delta+doff])
        color([i/Nblade,i/Nblade,i/Nblade])
        blade2();
    }

    translate([-soff,0,-1])
    rotate([0,0,90])
    scale([smagx,smagy,40])
    fan9red();
  }
    
}

//------------------------------------------------------------------
module fanyellow(first=0,last=Nblade-1){
    
  intersection(){
      for(i=[first:last]){
        translate([0,0,i*thick])
        rotate([0,0,i*delta+doff])
        color([i/Nblade,i/Nblade,i/Nblade])
        blade2();
    }

    translate([-soff,0,-1])
    rotate([0,0,90])
    scale([smagx,smagy,40])
    fan9yellow();
  }
    
}

//------------------------------------------------------------------
module fanblue(first=0,last=Nblade-1){
    
  intersection(){
      for(i=[first:last]){
        translate([0,0,i*thick])
        rotate([0,0,i*delta+doff])
        color([i/Nblade,i/Nblade,i/Nblade])
        blade2();
    }

    translate([-soff,0,-1])
    rotate([0,0,90])
    scale([smagx,smagy,40])
    fan9blue();
  }
    
}

//------------------------------------------------------------------
module fanblack(first=0,last=Nblade-1){
    
//  difference(){
    intersection(){
    union(){
      for(i=[first:last]){
          translate([0,0,i*thick])
          rotate([0,0,i*delta+doff])
          color([i/Nblade,i/Nblade,i/Nblade])
          blade2();
      }
    }

    translate([-soff,0,-1])
    rotate([0,0,90])
    scale([smagx,smagy,40]){
      fan9black();
    }
  }
    
}

//------------------------------------------------------------------
module fanblack2(first=0,last=Nblade-1){
    
      for(i=[first:last]){
          translate([0,0,i*thick])
          rotate([0,0,i*delta+doff])
          color([i/Nblade,i/Nblade,i/Nblade])
          blade1();
      }
    
}

//------------------------------------------------------------------
module unfanred(first=0,last=Nblade-1){

  for(i=[first:last]){
    // unform the fan
    translate([spread*i,0,-i*thick])
    rotate([0,0,180*i])
    translate([0,-yfix,0])
    rotate([0,0,-i*delta-doff])
    
    intersection(){
      translate([0,0,i*thick])
      rotate([0,0,i*delta+doff])
      color([i/Nblade,i/Nblade,i/Nblade])
      blade2();

      translate([-soff,0,-1])
      rotate([0,0,90])
      scale([smagx,smagy,40])
      fan9red();
    }
  }
}

//------------------------------------------------------------------
module unfanyellow(first=0,last=Nblade-1){

  for(i=[first:last]){
    // unform the fan
    translate([spread*i,0,-i*thick])
    rotate([0,0,180*i])
    translate([0,-yfix,0])
    rotate([0,0,-i*delta-doff])
    
    intersection(){
    //difference(){
      translate([0,0,i*thick])
      rotate([0,0,i*delta+doff])
      color([i/Nblade,i/Nblade,i/Nblade])
      blade2();

      translate([-soff,0,-1])
      rotate([0,0,90])
      scale([smagx,smagy,40]){      
      fan9yellow();
      }
    }
  }
}

//------------------------------------------------------------------
module unfanblue(first=0,last=Nblade-1){

  for(i=[first:last]){
    // unform the fan
    translate([spread*i,0,-i*thick])
    rotate([0,0,180*i])
    translate([0,-yfix,0])
    rotate([0,0,-i*delta-doff])
    
    intersection(){
      translate([0,0,i*thick])
      rotate([0,0,i*delta+doff])
      color([i/Nblade,i/Nblade,i/Nblade])
      blade2();

      translate([-soff,0,-1])
      rotate([0,0,90])
      scale([smagx,smagy,40])
      fan9blue();
    }
  }
}


//------------------------------------------------------------------
module unfanblack(first=0,last=Nblade-1){

  for(i=[first:last]){
    // unform the fan
    translate([spread*i,0,-i*thick])
    rotate([0,0,180*i])
    translate([0,-yfix,0])
    rotate([0,0,-i*delta-doff])
    
    intersection(){
    //difference(){
      translate([0,0,i*thick])
      rotate([0,0,i*delta+doff])
      color([i/Nblade,i/Nblade,i/Nblade])
      blade2();

      translate([-soff,0,-1])
      rotate([0,0,90])
      scale([smagx,smagy,40]){
        fan9black();
      }
    }
  }
}

//------------------------------------------------------------------
module unfanblack2(first=0,last=Nblade-1){

  for(i=[first:last]){
    // unform the fan
    translate([spread*i,0,-i*thick])
    rotate([0,0,180*i])
    translate([0,-yfix,0])
    rotate([0,0,-i*delta-doff])
    
    translate([0,0,i*thick])
    rotate([0,0,i*delta+doff])
    color([i/Nblade,i/Nblade,i/Nblade])
    blade1();

  }
}

//---------------------------------------------------------
module pivota(){

$fn=89;
  difference(){
    translate([0,0,0.5])
    cylinder(r=rbasehole-0.3,h=10.0);

    cylinder(r=0.7,h=60,center=true);
    metric_thread (diameter=5, pitch=1, length=9.5, internal=true);

    translate([0,0,0])
    cylinder(r1=3,r2=2,h=2);
  }

  difference(){
    translate([0,0,10.5])
    cylinder(r1=rbasehole+2,r2=rbasehole+1,h=thick);
    
    translate([0,0,14.0])
    cube([3,1.4,10],center=true);

  }
}

//---------------------------------------------------------
module pivotb(){

$fn=89;

  difference(){
    union(){
      cylinder(r1=2.7,r2=1.7,h=2);
      metric_thread (diameter=5-0.6, pitch=1, length=5*thick, internal=false, leadin=1);
    }
    cylinder(r=0.7,h=20,center=true);
  }
  difference(){
    translate([0,0,-thick])
    cylinder(r1=rbasehole+1,r2=rbasehole+2,h=thick);
    translate([0,0,-3])
    cube([3,1.4,10],center=true);
  }

}


//---------------------------------------------------------
module jig(tol=0.2){

$fn=89;

  difference(){
    // main boss
    translate([0,60,(2*thick)/2])
    cube([50,160,2*thick],center=true);

    // cut out center section to get 2 jigs
    translate([0,60,(2*thick)/2])
    cube([60,50,3*thick],center=true);
    
    // main blade
    union(){
      
      // at the pivot
      hull(){
        cylinder(r=rbase+tol,h=thick+tol);
        translate([0,0.25*mid,0])
        cylinder(r=3+tol,h=thick+tol);
      }
            
      // tail section
      hull(){
        translate([0,0,0])
        cylinder(r=rbasehole-1+tol,h=thick+tol);

        translate([0,-stub,0])
        cylinder(r=3+tol,h=thick+tol);
      }
            
       // main blade    
      hull(){
        translate([0,tall,0])
        scale([tipscale,1,1])
        cylinder(r=rtip-edge+tol,h=thick+tol);

        translate([0,-stub,0])
        cylinder(r=1.0-edge+tol,h=thick+tol);
      }
    
    
    }  // end of the union

    // edge
    union(){
      
     // main blade
      hull(){
        translate([0,tall,0])
        scale([tipscale,1,1])
        cylinder(r=rtip+tol,h=thick+tol);

        translate([0,-stub,0])
        cylinder(r=1.0+tol,h=thick+tol);
      }        
    }  // end of the union

    translate([-30,7.5,(4*thick)/2])
#    cube([30,55,4*thick],center=true);

  }
  translate([23,7.5,-(4*thick)/2])
  cube([4,55,4*thick],center=true);
  translate([23,112.5,-(4*thick)/2])
  cube([4,55,4*thick],center=true);
}


//====================================================================


if(0){
  difference(){
    union(){
      pivota();
      color("red")
      pivotb();
    }
    translate([10,0,8])
    cube([20,20,40],center=true);
  }
}

jig();

//fan5notblack();

//pivota();
//pivotb();


//    translate([-soff,0,-1])
//    rotate([0,0,90])
//    scale([smagx,smagy,40])
//    fan6notblack();

//fan1edge();
//fanred();
//fanyellow();
//fanblue();
//fanblack();
//fanblack2();
   
//unfanblack(3,3);

//unfanblack2(3,3);

//unfanred(3,3);

//unfanyellow(3,3);

//unfanblue(3,3);

//unfan1edge(3,3);


if(0){
  blade1();
  translate([0,0,5])
  blade1edge();
  translate([0,0,10])
  blade2();
}

//rotate([0,0,-90])
//translate([0,0,-10])
//fan1();
//translate([0,0,40])
//fan1Folded();
//unfan1();
//translate([0,0,30])
//fan5white();

//blade1edge();
//fan1edge();

//====================================================================
